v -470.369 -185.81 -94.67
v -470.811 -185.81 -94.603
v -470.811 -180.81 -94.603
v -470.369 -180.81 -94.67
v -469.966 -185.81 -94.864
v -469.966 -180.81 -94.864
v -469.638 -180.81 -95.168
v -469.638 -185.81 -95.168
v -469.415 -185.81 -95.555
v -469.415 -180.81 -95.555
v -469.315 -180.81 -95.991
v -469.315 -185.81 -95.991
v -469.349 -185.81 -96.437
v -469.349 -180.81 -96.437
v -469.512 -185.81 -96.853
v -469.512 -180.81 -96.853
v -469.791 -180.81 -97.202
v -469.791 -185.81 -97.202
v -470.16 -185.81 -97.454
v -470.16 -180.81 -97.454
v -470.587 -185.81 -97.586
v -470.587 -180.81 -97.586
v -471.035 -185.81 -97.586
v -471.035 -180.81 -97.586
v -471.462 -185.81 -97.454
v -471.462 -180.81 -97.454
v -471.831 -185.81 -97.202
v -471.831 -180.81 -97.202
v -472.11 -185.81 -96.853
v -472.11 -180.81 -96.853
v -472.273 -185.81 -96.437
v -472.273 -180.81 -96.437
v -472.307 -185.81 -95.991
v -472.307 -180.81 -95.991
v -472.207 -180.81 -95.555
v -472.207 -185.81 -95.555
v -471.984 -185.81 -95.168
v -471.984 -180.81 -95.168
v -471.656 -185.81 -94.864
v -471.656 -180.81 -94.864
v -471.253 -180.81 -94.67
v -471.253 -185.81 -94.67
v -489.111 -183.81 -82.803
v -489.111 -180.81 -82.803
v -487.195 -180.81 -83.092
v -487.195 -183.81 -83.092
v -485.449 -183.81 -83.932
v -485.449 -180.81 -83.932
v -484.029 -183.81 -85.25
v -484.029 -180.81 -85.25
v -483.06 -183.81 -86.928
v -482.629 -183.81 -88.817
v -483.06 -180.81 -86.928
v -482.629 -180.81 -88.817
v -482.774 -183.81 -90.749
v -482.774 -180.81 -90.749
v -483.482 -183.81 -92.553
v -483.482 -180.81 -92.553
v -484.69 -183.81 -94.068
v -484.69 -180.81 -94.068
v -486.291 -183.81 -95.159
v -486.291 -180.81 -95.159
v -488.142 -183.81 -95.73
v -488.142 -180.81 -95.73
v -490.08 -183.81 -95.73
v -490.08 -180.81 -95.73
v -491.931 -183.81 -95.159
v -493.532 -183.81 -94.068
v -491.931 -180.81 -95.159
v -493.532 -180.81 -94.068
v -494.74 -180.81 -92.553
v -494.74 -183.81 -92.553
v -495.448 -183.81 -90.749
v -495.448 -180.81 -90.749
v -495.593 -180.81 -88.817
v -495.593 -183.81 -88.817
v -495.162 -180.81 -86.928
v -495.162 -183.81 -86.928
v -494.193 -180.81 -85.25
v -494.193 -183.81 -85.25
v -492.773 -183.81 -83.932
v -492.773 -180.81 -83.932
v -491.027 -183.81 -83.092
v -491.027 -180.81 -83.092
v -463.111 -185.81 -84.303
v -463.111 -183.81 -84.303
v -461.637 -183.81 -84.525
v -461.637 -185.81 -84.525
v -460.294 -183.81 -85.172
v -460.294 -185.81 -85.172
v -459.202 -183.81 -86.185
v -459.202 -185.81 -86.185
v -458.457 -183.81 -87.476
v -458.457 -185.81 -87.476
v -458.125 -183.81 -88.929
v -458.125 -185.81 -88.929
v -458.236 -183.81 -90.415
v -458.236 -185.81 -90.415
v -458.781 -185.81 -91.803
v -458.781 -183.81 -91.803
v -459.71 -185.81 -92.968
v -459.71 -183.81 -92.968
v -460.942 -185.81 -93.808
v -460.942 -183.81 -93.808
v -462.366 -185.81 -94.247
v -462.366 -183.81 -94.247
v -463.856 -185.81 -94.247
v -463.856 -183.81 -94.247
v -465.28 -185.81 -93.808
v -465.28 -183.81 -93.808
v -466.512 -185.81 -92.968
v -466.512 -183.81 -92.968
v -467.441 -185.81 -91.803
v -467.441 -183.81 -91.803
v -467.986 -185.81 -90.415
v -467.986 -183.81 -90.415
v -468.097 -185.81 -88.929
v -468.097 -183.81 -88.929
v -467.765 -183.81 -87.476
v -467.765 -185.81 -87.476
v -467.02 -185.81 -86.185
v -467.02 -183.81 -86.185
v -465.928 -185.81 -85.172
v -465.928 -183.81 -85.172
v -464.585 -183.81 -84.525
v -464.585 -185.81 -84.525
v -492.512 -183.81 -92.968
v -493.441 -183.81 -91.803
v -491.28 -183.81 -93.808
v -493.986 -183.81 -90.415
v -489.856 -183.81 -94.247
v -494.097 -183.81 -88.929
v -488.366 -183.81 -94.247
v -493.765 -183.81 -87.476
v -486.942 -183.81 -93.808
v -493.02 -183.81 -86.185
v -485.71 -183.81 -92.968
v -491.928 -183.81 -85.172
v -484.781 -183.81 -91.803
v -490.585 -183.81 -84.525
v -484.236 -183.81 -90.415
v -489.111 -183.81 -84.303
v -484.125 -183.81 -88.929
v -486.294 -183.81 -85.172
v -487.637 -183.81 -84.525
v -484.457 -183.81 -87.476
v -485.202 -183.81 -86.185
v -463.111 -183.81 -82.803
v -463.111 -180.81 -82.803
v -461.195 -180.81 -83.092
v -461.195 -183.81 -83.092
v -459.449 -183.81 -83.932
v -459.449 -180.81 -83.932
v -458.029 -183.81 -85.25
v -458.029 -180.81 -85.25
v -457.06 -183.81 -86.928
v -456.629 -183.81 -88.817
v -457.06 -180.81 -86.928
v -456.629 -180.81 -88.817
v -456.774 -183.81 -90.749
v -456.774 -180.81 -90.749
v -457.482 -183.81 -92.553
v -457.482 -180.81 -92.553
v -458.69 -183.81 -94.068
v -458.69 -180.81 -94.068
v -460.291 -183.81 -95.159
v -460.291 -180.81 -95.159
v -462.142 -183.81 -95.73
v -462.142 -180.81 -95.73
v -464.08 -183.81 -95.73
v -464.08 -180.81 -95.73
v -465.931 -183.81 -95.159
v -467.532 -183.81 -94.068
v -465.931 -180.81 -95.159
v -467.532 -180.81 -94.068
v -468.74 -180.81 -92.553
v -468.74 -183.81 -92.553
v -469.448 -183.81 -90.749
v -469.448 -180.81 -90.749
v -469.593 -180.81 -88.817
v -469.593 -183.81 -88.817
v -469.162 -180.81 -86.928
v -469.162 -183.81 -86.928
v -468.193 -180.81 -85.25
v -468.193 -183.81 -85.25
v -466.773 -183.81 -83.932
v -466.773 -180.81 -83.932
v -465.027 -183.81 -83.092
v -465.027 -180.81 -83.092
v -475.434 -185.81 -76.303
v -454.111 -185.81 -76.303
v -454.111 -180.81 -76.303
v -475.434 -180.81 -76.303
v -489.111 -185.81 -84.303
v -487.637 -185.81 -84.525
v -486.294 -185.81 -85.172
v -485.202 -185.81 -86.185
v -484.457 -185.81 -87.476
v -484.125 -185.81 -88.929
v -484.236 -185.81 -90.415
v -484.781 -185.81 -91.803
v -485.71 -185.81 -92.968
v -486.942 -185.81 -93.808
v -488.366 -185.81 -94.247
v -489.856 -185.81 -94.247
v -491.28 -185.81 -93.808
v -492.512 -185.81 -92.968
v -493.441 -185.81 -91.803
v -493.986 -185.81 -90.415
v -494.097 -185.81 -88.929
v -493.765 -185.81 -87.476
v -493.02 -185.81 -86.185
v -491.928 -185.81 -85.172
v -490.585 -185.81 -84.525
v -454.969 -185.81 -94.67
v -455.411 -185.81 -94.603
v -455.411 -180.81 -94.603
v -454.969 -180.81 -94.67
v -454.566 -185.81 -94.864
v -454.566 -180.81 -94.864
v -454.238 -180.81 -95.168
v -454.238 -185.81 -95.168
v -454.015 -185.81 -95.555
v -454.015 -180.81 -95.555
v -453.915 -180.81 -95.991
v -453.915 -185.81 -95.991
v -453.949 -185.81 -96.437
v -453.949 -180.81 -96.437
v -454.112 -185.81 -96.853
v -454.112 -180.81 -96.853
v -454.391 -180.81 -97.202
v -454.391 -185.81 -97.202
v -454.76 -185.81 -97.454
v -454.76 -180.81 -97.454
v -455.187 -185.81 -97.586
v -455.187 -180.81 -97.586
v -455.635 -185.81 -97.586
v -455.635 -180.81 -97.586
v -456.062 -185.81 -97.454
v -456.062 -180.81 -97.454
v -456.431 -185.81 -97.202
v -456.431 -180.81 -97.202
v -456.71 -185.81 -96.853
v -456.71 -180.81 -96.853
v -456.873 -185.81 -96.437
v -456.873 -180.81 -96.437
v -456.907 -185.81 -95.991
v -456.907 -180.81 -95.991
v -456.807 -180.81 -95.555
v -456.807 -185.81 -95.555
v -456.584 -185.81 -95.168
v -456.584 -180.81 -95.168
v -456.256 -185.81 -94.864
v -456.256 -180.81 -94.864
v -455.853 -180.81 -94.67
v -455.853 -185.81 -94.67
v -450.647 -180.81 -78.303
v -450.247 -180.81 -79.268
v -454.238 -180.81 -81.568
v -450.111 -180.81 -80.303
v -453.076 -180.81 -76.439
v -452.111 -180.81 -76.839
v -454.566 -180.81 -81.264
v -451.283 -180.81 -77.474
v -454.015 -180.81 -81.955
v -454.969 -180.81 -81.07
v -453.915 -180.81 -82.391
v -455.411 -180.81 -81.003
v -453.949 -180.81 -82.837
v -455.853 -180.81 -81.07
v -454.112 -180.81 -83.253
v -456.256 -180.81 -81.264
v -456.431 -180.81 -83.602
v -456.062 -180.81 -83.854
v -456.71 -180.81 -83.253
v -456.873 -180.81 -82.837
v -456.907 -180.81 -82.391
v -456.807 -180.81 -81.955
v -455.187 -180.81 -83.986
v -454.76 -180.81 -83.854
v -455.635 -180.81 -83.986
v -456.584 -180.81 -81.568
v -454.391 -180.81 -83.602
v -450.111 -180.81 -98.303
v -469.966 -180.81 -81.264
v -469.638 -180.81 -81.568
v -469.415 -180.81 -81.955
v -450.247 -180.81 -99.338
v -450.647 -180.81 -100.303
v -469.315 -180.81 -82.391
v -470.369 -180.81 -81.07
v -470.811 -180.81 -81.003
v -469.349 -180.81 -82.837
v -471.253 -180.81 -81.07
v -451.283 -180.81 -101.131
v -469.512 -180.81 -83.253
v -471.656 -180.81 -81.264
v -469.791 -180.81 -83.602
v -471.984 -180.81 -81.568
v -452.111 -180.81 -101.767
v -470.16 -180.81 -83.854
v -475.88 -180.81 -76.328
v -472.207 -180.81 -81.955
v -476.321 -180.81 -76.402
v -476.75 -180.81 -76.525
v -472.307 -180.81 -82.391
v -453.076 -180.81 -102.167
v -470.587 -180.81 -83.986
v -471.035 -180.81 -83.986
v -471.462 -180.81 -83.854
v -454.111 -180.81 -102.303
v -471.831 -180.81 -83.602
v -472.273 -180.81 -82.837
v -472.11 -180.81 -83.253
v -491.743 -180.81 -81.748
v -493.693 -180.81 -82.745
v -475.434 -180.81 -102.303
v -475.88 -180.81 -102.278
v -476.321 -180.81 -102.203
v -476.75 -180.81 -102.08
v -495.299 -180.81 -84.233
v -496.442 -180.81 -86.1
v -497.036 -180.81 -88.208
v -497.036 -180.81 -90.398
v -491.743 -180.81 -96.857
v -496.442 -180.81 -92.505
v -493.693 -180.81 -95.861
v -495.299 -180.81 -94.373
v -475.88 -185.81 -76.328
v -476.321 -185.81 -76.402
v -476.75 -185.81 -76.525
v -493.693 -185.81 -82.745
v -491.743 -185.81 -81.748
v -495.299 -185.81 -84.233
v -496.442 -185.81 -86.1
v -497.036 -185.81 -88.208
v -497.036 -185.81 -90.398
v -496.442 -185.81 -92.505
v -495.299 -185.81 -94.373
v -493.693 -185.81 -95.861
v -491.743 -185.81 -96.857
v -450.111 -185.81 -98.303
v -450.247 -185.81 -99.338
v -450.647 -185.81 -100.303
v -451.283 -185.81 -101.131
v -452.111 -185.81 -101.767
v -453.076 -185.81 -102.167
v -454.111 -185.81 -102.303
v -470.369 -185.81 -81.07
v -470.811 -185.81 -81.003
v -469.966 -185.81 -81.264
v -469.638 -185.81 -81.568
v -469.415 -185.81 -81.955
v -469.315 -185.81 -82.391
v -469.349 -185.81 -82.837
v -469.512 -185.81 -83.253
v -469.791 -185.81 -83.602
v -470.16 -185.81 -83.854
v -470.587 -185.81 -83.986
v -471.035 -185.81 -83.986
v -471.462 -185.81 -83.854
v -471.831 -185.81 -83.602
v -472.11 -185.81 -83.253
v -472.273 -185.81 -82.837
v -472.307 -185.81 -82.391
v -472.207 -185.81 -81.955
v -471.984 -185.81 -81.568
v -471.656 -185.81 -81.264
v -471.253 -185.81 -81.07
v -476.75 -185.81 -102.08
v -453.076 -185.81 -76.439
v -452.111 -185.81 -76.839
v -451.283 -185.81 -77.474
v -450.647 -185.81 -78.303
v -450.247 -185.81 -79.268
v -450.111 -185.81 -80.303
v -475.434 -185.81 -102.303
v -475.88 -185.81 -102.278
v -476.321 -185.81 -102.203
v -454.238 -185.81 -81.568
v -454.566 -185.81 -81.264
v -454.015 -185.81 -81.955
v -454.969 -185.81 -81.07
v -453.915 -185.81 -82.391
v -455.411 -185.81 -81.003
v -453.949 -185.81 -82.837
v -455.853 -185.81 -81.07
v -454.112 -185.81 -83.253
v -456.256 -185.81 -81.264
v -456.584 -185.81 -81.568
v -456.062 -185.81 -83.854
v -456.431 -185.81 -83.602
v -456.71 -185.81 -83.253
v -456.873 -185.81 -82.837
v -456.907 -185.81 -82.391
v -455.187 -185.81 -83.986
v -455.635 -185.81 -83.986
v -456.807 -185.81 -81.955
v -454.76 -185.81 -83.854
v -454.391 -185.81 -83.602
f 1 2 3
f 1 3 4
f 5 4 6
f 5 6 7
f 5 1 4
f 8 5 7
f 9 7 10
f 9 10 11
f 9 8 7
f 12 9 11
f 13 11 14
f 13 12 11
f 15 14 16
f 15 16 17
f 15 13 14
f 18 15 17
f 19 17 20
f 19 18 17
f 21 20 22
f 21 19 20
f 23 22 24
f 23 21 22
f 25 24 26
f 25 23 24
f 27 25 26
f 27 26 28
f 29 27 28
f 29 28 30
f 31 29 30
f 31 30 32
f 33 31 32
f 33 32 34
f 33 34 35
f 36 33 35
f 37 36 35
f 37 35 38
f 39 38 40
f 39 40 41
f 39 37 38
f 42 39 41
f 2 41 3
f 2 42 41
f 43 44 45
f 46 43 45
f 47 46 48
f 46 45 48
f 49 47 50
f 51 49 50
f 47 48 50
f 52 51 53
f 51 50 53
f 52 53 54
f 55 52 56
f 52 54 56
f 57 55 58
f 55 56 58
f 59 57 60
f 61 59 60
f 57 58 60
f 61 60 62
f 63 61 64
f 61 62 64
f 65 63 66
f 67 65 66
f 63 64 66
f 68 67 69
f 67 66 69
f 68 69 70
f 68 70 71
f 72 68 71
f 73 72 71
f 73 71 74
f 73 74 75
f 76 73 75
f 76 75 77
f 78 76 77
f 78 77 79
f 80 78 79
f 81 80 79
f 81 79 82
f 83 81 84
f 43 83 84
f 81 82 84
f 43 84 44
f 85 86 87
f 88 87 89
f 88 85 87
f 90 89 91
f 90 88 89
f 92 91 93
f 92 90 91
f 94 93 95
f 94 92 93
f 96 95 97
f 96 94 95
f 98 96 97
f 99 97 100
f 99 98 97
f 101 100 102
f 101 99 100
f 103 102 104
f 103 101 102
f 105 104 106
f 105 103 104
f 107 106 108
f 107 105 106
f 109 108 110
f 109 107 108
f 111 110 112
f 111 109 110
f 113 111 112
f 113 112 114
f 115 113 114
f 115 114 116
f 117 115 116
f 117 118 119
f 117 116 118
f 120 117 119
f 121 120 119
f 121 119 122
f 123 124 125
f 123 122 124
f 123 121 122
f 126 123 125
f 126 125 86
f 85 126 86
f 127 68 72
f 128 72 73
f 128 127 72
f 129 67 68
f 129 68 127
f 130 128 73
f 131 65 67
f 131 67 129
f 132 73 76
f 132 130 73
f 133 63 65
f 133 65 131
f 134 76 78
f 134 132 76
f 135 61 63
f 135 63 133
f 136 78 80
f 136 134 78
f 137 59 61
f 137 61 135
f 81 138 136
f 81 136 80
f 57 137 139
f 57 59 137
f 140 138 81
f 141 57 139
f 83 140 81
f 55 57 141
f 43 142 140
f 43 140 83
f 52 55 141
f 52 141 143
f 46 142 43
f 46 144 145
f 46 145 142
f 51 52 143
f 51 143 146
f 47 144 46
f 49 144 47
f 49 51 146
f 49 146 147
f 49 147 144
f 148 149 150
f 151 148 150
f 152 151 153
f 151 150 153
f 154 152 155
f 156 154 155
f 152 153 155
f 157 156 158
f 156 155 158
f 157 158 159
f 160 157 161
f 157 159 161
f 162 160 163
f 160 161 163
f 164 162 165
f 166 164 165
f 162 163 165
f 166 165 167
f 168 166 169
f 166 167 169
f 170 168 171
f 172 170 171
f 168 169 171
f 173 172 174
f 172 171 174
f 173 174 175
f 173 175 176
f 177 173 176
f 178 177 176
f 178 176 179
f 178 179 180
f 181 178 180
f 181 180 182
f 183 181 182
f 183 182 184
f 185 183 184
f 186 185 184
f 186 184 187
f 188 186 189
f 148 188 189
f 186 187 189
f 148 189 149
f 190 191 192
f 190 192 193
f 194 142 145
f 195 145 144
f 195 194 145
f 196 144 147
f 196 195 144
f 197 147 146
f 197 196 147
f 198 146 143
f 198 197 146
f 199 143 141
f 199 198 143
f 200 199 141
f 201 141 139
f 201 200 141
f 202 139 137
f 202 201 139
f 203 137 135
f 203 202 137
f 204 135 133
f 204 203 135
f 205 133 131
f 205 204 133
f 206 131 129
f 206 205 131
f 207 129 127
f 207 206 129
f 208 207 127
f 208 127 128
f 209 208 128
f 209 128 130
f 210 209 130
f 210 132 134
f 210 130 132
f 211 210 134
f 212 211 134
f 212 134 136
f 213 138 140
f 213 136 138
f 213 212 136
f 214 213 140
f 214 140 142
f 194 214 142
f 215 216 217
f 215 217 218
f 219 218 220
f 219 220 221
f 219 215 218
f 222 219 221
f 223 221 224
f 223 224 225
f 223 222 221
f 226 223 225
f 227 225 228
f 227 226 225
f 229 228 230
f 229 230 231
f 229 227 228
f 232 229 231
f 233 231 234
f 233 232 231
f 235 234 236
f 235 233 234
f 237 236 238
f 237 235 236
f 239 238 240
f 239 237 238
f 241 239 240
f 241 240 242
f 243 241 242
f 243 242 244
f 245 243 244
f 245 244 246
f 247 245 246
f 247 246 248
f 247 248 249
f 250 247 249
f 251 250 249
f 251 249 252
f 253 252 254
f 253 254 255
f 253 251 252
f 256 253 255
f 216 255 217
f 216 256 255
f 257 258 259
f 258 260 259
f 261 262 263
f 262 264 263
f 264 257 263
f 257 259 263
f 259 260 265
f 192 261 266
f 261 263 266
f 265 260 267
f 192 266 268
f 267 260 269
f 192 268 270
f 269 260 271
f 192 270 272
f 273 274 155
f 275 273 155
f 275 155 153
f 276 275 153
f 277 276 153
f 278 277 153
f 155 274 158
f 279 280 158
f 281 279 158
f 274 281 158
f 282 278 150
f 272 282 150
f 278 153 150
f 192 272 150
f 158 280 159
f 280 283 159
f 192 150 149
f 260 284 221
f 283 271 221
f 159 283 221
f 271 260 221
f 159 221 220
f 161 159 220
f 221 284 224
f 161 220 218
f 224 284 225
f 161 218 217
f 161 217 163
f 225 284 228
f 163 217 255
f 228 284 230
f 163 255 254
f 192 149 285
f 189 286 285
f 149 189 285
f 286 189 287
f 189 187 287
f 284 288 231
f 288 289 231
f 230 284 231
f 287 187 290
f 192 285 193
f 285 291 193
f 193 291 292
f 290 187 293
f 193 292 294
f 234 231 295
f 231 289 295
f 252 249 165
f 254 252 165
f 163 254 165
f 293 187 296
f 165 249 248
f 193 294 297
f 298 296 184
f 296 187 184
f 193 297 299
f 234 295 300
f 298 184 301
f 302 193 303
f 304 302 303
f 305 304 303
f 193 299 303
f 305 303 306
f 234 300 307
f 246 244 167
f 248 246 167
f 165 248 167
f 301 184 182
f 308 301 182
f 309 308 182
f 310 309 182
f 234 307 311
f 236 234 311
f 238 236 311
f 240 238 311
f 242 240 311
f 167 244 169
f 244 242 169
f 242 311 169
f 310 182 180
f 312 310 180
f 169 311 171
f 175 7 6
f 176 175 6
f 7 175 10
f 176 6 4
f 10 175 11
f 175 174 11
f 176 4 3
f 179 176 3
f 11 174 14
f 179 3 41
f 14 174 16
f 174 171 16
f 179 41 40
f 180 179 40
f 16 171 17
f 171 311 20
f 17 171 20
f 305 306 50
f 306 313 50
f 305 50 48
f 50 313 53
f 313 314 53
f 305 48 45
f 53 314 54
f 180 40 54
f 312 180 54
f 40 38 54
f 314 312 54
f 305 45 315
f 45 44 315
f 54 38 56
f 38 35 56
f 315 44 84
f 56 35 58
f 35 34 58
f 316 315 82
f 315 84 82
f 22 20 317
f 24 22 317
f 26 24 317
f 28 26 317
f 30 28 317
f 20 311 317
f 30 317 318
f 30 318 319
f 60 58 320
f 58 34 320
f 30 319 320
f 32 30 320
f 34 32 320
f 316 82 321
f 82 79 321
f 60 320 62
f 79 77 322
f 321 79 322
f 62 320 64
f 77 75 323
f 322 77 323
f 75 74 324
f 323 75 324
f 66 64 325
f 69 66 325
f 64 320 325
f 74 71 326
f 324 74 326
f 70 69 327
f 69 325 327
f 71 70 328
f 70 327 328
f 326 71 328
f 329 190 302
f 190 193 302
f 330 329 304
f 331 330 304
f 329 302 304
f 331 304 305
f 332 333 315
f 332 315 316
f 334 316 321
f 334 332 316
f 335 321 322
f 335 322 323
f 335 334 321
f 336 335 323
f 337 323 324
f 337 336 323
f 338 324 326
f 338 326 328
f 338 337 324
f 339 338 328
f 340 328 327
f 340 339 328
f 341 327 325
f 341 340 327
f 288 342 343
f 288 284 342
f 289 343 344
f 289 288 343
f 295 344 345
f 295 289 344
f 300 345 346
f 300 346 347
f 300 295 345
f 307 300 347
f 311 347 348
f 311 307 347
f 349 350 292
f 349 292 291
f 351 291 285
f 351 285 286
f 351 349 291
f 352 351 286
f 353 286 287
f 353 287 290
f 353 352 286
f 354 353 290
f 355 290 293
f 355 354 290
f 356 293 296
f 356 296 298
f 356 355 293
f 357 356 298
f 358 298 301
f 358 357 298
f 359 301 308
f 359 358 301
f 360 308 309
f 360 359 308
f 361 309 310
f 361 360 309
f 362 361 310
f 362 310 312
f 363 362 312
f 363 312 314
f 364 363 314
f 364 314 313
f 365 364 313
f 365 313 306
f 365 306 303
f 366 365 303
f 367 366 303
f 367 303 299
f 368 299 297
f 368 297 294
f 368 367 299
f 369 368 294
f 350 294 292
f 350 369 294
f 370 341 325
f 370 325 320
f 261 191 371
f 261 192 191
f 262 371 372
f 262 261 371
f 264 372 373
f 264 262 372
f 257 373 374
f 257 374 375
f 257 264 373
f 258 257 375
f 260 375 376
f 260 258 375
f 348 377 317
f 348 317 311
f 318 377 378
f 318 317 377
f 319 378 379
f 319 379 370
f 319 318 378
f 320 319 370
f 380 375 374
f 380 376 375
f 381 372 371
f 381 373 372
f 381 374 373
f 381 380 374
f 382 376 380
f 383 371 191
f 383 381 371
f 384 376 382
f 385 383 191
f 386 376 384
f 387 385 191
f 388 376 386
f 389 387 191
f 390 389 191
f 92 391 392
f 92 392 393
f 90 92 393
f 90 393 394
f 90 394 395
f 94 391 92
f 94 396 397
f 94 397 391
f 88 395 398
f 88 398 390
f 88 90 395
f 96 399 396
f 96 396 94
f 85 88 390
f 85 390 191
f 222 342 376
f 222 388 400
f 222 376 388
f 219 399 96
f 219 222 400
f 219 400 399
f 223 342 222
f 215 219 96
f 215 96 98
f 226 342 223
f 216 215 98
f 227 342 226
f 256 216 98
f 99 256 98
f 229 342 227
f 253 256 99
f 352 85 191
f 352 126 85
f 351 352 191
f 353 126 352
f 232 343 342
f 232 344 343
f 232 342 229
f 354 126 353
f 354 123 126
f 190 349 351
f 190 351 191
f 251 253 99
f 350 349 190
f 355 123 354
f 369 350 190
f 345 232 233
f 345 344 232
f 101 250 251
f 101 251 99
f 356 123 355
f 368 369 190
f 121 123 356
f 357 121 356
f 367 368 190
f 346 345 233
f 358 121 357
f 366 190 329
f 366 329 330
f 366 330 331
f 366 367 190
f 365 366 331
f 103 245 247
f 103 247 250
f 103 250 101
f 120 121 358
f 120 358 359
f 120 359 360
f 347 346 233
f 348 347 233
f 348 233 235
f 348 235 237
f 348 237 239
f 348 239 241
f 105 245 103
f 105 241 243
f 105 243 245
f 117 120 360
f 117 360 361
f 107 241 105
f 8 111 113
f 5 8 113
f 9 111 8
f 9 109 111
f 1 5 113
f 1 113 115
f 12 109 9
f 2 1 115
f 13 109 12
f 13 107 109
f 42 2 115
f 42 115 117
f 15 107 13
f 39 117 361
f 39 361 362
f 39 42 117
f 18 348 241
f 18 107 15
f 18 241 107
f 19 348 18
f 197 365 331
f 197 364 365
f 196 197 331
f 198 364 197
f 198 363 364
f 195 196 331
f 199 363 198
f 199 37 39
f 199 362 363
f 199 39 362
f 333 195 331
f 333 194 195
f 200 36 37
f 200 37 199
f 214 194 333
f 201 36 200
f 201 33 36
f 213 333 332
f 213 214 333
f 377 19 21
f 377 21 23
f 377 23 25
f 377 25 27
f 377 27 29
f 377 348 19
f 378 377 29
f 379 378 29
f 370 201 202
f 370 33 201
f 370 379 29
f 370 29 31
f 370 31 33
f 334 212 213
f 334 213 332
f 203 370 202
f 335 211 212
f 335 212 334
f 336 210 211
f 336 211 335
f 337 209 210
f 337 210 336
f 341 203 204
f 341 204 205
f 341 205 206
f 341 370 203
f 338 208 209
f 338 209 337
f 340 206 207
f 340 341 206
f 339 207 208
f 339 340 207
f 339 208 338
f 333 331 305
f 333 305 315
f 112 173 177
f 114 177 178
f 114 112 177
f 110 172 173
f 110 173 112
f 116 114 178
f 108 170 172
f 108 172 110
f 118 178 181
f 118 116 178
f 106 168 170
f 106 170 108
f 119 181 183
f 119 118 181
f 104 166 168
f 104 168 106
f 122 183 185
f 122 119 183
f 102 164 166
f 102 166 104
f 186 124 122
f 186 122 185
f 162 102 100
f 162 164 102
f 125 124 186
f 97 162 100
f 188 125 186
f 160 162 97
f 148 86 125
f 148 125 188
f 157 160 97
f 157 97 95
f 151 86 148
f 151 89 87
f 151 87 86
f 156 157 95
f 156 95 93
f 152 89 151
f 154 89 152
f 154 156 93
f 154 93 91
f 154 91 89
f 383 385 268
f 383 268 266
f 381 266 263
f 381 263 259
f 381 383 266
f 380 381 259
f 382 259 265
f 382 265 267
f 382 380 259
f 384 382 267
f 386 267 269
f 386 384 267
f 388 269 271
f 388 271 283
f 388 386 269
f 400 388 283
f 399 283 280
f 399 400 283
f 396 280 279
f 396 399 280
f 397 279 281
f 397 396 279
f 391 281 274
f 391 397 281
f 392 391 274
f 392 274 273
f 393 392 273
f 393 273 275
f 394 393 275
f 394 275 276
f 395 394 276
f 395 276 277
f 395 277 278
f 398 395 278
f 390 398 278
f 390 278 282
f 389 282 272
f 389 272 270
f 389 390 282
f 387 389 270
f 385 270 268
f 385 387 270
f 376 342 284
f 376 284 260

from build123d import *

# Parameters (mm, degrees)
SKETCH_1_R          = 1.5
SKETCH_1_R_2        = 5
EXTRUDE_1_DEPTH     = 5
SKETCH_2_R          = 6.5
CUT_EXTRUDE_1_DEPTH = 3
FILLET_1_R          = 4


with BuildPart() as part:
    # Эскиз1 → Бобышка-Вытянуть1 (new body)
    with BuildSketch(Plane(origin=(0, -185.809804521, 0), x_dir=(1, 0, 0), z_dir=(0, 1, 0))):
        with BuildLine():
            Line((-450.111062941, 89.302859511), (-450.111062941, 76.302859511))
            Line((-450.111062941, 76.302859511), (-476.111062941, 76.302859511))
            Line((-476.111062941, 76.302859511), (-491.742757589, 81.748272926))
            ThreePointArc((-491.742757589, 81.748272926), (-497.110912638, 89.302859511), (-491.742757589, 96.857446095))
            Line((-491.742757589, 96.857446095), (-476.111062941, 102.302859511))
            Line((-476.111062941, 102.302859511), (-450.111062941, 102.302859511))
            Line((-450.111062941, 102.302859511), (-450.111062941, 89.302859511))
        make_face()
        with Locations(Location((-470.811062941, 96.102859511, 0), (0, 0, 270))):
            Circle(SKETCH_1_R, mode=Mode.SUBTRACT)
        with Locations(Location((-455.411062941, 96.102859511, 0), (0, 0, 270))):
            Circle(SKETCH_1_R, mode=Mode.SUBTRACT)
        with Locations(Location((-455.411062941, 82.502859511, 0), (0, 0, 270))):
            Circle(SKETCH_1_R, mode=Mode.SUBTRACT)
        with Locations(Location((-470.811062941, 82.502859511, 0), (0, 0, 270))):
            Circle(SKETCH_1_R, mode=Mode.SUBTRACT)
        with Locations(Location((-463.111062941, 89.302859511, 0), (0, 0, 270))):
            Circle(SKETCH_1_R_2, mode=Mode.SUBTRACT)
        with Locations(Location((-489.111062941, 89.302859511, 0), (0, 0, 270))):
            Circle(SKETCH_1_R_2, mode=Mode.SUBTRACT)
    extrude(amount=EXTRUDE_1_DEPTH)

    # Эскиз2 → Вырез-Вытянуть1 (cut)
    with BuildSketch(Plane(origin=(0, -180.809804521, 0), x_dir=(1, 0, 0), z_dir=(0, 1, 0))):
        with Locations(Location((-463.111062941, 89.302859511, 0), (0, 0, 270))):
            Circle(SKETCH_2_R)
        with Locations(Location((-489.111062941, 89.302859511, 0), (0, 0, 270))):
            Circle(SKETCH_2_R)
    extrude(amount=-CUT_EXTRUDE_1_DEPTH, mode=Mode.SUBTRACT)

    # Скругление1
    fillet_1_edges = [part.edges().sort_by_distance(p)[0] for p in [
        (-476.111062941, -183.309804521, -102.302859511),
        (-450.111062941, -183.309804521, -102.302859511),
        (-450.111062941, -183.309804521, -76.302859511),
        (-476.111062941, -183.309804521, -76.302859511),
    ]]
    fillet(fillet_1_edges, radius=FILLET_1_R)


solid = part.part
